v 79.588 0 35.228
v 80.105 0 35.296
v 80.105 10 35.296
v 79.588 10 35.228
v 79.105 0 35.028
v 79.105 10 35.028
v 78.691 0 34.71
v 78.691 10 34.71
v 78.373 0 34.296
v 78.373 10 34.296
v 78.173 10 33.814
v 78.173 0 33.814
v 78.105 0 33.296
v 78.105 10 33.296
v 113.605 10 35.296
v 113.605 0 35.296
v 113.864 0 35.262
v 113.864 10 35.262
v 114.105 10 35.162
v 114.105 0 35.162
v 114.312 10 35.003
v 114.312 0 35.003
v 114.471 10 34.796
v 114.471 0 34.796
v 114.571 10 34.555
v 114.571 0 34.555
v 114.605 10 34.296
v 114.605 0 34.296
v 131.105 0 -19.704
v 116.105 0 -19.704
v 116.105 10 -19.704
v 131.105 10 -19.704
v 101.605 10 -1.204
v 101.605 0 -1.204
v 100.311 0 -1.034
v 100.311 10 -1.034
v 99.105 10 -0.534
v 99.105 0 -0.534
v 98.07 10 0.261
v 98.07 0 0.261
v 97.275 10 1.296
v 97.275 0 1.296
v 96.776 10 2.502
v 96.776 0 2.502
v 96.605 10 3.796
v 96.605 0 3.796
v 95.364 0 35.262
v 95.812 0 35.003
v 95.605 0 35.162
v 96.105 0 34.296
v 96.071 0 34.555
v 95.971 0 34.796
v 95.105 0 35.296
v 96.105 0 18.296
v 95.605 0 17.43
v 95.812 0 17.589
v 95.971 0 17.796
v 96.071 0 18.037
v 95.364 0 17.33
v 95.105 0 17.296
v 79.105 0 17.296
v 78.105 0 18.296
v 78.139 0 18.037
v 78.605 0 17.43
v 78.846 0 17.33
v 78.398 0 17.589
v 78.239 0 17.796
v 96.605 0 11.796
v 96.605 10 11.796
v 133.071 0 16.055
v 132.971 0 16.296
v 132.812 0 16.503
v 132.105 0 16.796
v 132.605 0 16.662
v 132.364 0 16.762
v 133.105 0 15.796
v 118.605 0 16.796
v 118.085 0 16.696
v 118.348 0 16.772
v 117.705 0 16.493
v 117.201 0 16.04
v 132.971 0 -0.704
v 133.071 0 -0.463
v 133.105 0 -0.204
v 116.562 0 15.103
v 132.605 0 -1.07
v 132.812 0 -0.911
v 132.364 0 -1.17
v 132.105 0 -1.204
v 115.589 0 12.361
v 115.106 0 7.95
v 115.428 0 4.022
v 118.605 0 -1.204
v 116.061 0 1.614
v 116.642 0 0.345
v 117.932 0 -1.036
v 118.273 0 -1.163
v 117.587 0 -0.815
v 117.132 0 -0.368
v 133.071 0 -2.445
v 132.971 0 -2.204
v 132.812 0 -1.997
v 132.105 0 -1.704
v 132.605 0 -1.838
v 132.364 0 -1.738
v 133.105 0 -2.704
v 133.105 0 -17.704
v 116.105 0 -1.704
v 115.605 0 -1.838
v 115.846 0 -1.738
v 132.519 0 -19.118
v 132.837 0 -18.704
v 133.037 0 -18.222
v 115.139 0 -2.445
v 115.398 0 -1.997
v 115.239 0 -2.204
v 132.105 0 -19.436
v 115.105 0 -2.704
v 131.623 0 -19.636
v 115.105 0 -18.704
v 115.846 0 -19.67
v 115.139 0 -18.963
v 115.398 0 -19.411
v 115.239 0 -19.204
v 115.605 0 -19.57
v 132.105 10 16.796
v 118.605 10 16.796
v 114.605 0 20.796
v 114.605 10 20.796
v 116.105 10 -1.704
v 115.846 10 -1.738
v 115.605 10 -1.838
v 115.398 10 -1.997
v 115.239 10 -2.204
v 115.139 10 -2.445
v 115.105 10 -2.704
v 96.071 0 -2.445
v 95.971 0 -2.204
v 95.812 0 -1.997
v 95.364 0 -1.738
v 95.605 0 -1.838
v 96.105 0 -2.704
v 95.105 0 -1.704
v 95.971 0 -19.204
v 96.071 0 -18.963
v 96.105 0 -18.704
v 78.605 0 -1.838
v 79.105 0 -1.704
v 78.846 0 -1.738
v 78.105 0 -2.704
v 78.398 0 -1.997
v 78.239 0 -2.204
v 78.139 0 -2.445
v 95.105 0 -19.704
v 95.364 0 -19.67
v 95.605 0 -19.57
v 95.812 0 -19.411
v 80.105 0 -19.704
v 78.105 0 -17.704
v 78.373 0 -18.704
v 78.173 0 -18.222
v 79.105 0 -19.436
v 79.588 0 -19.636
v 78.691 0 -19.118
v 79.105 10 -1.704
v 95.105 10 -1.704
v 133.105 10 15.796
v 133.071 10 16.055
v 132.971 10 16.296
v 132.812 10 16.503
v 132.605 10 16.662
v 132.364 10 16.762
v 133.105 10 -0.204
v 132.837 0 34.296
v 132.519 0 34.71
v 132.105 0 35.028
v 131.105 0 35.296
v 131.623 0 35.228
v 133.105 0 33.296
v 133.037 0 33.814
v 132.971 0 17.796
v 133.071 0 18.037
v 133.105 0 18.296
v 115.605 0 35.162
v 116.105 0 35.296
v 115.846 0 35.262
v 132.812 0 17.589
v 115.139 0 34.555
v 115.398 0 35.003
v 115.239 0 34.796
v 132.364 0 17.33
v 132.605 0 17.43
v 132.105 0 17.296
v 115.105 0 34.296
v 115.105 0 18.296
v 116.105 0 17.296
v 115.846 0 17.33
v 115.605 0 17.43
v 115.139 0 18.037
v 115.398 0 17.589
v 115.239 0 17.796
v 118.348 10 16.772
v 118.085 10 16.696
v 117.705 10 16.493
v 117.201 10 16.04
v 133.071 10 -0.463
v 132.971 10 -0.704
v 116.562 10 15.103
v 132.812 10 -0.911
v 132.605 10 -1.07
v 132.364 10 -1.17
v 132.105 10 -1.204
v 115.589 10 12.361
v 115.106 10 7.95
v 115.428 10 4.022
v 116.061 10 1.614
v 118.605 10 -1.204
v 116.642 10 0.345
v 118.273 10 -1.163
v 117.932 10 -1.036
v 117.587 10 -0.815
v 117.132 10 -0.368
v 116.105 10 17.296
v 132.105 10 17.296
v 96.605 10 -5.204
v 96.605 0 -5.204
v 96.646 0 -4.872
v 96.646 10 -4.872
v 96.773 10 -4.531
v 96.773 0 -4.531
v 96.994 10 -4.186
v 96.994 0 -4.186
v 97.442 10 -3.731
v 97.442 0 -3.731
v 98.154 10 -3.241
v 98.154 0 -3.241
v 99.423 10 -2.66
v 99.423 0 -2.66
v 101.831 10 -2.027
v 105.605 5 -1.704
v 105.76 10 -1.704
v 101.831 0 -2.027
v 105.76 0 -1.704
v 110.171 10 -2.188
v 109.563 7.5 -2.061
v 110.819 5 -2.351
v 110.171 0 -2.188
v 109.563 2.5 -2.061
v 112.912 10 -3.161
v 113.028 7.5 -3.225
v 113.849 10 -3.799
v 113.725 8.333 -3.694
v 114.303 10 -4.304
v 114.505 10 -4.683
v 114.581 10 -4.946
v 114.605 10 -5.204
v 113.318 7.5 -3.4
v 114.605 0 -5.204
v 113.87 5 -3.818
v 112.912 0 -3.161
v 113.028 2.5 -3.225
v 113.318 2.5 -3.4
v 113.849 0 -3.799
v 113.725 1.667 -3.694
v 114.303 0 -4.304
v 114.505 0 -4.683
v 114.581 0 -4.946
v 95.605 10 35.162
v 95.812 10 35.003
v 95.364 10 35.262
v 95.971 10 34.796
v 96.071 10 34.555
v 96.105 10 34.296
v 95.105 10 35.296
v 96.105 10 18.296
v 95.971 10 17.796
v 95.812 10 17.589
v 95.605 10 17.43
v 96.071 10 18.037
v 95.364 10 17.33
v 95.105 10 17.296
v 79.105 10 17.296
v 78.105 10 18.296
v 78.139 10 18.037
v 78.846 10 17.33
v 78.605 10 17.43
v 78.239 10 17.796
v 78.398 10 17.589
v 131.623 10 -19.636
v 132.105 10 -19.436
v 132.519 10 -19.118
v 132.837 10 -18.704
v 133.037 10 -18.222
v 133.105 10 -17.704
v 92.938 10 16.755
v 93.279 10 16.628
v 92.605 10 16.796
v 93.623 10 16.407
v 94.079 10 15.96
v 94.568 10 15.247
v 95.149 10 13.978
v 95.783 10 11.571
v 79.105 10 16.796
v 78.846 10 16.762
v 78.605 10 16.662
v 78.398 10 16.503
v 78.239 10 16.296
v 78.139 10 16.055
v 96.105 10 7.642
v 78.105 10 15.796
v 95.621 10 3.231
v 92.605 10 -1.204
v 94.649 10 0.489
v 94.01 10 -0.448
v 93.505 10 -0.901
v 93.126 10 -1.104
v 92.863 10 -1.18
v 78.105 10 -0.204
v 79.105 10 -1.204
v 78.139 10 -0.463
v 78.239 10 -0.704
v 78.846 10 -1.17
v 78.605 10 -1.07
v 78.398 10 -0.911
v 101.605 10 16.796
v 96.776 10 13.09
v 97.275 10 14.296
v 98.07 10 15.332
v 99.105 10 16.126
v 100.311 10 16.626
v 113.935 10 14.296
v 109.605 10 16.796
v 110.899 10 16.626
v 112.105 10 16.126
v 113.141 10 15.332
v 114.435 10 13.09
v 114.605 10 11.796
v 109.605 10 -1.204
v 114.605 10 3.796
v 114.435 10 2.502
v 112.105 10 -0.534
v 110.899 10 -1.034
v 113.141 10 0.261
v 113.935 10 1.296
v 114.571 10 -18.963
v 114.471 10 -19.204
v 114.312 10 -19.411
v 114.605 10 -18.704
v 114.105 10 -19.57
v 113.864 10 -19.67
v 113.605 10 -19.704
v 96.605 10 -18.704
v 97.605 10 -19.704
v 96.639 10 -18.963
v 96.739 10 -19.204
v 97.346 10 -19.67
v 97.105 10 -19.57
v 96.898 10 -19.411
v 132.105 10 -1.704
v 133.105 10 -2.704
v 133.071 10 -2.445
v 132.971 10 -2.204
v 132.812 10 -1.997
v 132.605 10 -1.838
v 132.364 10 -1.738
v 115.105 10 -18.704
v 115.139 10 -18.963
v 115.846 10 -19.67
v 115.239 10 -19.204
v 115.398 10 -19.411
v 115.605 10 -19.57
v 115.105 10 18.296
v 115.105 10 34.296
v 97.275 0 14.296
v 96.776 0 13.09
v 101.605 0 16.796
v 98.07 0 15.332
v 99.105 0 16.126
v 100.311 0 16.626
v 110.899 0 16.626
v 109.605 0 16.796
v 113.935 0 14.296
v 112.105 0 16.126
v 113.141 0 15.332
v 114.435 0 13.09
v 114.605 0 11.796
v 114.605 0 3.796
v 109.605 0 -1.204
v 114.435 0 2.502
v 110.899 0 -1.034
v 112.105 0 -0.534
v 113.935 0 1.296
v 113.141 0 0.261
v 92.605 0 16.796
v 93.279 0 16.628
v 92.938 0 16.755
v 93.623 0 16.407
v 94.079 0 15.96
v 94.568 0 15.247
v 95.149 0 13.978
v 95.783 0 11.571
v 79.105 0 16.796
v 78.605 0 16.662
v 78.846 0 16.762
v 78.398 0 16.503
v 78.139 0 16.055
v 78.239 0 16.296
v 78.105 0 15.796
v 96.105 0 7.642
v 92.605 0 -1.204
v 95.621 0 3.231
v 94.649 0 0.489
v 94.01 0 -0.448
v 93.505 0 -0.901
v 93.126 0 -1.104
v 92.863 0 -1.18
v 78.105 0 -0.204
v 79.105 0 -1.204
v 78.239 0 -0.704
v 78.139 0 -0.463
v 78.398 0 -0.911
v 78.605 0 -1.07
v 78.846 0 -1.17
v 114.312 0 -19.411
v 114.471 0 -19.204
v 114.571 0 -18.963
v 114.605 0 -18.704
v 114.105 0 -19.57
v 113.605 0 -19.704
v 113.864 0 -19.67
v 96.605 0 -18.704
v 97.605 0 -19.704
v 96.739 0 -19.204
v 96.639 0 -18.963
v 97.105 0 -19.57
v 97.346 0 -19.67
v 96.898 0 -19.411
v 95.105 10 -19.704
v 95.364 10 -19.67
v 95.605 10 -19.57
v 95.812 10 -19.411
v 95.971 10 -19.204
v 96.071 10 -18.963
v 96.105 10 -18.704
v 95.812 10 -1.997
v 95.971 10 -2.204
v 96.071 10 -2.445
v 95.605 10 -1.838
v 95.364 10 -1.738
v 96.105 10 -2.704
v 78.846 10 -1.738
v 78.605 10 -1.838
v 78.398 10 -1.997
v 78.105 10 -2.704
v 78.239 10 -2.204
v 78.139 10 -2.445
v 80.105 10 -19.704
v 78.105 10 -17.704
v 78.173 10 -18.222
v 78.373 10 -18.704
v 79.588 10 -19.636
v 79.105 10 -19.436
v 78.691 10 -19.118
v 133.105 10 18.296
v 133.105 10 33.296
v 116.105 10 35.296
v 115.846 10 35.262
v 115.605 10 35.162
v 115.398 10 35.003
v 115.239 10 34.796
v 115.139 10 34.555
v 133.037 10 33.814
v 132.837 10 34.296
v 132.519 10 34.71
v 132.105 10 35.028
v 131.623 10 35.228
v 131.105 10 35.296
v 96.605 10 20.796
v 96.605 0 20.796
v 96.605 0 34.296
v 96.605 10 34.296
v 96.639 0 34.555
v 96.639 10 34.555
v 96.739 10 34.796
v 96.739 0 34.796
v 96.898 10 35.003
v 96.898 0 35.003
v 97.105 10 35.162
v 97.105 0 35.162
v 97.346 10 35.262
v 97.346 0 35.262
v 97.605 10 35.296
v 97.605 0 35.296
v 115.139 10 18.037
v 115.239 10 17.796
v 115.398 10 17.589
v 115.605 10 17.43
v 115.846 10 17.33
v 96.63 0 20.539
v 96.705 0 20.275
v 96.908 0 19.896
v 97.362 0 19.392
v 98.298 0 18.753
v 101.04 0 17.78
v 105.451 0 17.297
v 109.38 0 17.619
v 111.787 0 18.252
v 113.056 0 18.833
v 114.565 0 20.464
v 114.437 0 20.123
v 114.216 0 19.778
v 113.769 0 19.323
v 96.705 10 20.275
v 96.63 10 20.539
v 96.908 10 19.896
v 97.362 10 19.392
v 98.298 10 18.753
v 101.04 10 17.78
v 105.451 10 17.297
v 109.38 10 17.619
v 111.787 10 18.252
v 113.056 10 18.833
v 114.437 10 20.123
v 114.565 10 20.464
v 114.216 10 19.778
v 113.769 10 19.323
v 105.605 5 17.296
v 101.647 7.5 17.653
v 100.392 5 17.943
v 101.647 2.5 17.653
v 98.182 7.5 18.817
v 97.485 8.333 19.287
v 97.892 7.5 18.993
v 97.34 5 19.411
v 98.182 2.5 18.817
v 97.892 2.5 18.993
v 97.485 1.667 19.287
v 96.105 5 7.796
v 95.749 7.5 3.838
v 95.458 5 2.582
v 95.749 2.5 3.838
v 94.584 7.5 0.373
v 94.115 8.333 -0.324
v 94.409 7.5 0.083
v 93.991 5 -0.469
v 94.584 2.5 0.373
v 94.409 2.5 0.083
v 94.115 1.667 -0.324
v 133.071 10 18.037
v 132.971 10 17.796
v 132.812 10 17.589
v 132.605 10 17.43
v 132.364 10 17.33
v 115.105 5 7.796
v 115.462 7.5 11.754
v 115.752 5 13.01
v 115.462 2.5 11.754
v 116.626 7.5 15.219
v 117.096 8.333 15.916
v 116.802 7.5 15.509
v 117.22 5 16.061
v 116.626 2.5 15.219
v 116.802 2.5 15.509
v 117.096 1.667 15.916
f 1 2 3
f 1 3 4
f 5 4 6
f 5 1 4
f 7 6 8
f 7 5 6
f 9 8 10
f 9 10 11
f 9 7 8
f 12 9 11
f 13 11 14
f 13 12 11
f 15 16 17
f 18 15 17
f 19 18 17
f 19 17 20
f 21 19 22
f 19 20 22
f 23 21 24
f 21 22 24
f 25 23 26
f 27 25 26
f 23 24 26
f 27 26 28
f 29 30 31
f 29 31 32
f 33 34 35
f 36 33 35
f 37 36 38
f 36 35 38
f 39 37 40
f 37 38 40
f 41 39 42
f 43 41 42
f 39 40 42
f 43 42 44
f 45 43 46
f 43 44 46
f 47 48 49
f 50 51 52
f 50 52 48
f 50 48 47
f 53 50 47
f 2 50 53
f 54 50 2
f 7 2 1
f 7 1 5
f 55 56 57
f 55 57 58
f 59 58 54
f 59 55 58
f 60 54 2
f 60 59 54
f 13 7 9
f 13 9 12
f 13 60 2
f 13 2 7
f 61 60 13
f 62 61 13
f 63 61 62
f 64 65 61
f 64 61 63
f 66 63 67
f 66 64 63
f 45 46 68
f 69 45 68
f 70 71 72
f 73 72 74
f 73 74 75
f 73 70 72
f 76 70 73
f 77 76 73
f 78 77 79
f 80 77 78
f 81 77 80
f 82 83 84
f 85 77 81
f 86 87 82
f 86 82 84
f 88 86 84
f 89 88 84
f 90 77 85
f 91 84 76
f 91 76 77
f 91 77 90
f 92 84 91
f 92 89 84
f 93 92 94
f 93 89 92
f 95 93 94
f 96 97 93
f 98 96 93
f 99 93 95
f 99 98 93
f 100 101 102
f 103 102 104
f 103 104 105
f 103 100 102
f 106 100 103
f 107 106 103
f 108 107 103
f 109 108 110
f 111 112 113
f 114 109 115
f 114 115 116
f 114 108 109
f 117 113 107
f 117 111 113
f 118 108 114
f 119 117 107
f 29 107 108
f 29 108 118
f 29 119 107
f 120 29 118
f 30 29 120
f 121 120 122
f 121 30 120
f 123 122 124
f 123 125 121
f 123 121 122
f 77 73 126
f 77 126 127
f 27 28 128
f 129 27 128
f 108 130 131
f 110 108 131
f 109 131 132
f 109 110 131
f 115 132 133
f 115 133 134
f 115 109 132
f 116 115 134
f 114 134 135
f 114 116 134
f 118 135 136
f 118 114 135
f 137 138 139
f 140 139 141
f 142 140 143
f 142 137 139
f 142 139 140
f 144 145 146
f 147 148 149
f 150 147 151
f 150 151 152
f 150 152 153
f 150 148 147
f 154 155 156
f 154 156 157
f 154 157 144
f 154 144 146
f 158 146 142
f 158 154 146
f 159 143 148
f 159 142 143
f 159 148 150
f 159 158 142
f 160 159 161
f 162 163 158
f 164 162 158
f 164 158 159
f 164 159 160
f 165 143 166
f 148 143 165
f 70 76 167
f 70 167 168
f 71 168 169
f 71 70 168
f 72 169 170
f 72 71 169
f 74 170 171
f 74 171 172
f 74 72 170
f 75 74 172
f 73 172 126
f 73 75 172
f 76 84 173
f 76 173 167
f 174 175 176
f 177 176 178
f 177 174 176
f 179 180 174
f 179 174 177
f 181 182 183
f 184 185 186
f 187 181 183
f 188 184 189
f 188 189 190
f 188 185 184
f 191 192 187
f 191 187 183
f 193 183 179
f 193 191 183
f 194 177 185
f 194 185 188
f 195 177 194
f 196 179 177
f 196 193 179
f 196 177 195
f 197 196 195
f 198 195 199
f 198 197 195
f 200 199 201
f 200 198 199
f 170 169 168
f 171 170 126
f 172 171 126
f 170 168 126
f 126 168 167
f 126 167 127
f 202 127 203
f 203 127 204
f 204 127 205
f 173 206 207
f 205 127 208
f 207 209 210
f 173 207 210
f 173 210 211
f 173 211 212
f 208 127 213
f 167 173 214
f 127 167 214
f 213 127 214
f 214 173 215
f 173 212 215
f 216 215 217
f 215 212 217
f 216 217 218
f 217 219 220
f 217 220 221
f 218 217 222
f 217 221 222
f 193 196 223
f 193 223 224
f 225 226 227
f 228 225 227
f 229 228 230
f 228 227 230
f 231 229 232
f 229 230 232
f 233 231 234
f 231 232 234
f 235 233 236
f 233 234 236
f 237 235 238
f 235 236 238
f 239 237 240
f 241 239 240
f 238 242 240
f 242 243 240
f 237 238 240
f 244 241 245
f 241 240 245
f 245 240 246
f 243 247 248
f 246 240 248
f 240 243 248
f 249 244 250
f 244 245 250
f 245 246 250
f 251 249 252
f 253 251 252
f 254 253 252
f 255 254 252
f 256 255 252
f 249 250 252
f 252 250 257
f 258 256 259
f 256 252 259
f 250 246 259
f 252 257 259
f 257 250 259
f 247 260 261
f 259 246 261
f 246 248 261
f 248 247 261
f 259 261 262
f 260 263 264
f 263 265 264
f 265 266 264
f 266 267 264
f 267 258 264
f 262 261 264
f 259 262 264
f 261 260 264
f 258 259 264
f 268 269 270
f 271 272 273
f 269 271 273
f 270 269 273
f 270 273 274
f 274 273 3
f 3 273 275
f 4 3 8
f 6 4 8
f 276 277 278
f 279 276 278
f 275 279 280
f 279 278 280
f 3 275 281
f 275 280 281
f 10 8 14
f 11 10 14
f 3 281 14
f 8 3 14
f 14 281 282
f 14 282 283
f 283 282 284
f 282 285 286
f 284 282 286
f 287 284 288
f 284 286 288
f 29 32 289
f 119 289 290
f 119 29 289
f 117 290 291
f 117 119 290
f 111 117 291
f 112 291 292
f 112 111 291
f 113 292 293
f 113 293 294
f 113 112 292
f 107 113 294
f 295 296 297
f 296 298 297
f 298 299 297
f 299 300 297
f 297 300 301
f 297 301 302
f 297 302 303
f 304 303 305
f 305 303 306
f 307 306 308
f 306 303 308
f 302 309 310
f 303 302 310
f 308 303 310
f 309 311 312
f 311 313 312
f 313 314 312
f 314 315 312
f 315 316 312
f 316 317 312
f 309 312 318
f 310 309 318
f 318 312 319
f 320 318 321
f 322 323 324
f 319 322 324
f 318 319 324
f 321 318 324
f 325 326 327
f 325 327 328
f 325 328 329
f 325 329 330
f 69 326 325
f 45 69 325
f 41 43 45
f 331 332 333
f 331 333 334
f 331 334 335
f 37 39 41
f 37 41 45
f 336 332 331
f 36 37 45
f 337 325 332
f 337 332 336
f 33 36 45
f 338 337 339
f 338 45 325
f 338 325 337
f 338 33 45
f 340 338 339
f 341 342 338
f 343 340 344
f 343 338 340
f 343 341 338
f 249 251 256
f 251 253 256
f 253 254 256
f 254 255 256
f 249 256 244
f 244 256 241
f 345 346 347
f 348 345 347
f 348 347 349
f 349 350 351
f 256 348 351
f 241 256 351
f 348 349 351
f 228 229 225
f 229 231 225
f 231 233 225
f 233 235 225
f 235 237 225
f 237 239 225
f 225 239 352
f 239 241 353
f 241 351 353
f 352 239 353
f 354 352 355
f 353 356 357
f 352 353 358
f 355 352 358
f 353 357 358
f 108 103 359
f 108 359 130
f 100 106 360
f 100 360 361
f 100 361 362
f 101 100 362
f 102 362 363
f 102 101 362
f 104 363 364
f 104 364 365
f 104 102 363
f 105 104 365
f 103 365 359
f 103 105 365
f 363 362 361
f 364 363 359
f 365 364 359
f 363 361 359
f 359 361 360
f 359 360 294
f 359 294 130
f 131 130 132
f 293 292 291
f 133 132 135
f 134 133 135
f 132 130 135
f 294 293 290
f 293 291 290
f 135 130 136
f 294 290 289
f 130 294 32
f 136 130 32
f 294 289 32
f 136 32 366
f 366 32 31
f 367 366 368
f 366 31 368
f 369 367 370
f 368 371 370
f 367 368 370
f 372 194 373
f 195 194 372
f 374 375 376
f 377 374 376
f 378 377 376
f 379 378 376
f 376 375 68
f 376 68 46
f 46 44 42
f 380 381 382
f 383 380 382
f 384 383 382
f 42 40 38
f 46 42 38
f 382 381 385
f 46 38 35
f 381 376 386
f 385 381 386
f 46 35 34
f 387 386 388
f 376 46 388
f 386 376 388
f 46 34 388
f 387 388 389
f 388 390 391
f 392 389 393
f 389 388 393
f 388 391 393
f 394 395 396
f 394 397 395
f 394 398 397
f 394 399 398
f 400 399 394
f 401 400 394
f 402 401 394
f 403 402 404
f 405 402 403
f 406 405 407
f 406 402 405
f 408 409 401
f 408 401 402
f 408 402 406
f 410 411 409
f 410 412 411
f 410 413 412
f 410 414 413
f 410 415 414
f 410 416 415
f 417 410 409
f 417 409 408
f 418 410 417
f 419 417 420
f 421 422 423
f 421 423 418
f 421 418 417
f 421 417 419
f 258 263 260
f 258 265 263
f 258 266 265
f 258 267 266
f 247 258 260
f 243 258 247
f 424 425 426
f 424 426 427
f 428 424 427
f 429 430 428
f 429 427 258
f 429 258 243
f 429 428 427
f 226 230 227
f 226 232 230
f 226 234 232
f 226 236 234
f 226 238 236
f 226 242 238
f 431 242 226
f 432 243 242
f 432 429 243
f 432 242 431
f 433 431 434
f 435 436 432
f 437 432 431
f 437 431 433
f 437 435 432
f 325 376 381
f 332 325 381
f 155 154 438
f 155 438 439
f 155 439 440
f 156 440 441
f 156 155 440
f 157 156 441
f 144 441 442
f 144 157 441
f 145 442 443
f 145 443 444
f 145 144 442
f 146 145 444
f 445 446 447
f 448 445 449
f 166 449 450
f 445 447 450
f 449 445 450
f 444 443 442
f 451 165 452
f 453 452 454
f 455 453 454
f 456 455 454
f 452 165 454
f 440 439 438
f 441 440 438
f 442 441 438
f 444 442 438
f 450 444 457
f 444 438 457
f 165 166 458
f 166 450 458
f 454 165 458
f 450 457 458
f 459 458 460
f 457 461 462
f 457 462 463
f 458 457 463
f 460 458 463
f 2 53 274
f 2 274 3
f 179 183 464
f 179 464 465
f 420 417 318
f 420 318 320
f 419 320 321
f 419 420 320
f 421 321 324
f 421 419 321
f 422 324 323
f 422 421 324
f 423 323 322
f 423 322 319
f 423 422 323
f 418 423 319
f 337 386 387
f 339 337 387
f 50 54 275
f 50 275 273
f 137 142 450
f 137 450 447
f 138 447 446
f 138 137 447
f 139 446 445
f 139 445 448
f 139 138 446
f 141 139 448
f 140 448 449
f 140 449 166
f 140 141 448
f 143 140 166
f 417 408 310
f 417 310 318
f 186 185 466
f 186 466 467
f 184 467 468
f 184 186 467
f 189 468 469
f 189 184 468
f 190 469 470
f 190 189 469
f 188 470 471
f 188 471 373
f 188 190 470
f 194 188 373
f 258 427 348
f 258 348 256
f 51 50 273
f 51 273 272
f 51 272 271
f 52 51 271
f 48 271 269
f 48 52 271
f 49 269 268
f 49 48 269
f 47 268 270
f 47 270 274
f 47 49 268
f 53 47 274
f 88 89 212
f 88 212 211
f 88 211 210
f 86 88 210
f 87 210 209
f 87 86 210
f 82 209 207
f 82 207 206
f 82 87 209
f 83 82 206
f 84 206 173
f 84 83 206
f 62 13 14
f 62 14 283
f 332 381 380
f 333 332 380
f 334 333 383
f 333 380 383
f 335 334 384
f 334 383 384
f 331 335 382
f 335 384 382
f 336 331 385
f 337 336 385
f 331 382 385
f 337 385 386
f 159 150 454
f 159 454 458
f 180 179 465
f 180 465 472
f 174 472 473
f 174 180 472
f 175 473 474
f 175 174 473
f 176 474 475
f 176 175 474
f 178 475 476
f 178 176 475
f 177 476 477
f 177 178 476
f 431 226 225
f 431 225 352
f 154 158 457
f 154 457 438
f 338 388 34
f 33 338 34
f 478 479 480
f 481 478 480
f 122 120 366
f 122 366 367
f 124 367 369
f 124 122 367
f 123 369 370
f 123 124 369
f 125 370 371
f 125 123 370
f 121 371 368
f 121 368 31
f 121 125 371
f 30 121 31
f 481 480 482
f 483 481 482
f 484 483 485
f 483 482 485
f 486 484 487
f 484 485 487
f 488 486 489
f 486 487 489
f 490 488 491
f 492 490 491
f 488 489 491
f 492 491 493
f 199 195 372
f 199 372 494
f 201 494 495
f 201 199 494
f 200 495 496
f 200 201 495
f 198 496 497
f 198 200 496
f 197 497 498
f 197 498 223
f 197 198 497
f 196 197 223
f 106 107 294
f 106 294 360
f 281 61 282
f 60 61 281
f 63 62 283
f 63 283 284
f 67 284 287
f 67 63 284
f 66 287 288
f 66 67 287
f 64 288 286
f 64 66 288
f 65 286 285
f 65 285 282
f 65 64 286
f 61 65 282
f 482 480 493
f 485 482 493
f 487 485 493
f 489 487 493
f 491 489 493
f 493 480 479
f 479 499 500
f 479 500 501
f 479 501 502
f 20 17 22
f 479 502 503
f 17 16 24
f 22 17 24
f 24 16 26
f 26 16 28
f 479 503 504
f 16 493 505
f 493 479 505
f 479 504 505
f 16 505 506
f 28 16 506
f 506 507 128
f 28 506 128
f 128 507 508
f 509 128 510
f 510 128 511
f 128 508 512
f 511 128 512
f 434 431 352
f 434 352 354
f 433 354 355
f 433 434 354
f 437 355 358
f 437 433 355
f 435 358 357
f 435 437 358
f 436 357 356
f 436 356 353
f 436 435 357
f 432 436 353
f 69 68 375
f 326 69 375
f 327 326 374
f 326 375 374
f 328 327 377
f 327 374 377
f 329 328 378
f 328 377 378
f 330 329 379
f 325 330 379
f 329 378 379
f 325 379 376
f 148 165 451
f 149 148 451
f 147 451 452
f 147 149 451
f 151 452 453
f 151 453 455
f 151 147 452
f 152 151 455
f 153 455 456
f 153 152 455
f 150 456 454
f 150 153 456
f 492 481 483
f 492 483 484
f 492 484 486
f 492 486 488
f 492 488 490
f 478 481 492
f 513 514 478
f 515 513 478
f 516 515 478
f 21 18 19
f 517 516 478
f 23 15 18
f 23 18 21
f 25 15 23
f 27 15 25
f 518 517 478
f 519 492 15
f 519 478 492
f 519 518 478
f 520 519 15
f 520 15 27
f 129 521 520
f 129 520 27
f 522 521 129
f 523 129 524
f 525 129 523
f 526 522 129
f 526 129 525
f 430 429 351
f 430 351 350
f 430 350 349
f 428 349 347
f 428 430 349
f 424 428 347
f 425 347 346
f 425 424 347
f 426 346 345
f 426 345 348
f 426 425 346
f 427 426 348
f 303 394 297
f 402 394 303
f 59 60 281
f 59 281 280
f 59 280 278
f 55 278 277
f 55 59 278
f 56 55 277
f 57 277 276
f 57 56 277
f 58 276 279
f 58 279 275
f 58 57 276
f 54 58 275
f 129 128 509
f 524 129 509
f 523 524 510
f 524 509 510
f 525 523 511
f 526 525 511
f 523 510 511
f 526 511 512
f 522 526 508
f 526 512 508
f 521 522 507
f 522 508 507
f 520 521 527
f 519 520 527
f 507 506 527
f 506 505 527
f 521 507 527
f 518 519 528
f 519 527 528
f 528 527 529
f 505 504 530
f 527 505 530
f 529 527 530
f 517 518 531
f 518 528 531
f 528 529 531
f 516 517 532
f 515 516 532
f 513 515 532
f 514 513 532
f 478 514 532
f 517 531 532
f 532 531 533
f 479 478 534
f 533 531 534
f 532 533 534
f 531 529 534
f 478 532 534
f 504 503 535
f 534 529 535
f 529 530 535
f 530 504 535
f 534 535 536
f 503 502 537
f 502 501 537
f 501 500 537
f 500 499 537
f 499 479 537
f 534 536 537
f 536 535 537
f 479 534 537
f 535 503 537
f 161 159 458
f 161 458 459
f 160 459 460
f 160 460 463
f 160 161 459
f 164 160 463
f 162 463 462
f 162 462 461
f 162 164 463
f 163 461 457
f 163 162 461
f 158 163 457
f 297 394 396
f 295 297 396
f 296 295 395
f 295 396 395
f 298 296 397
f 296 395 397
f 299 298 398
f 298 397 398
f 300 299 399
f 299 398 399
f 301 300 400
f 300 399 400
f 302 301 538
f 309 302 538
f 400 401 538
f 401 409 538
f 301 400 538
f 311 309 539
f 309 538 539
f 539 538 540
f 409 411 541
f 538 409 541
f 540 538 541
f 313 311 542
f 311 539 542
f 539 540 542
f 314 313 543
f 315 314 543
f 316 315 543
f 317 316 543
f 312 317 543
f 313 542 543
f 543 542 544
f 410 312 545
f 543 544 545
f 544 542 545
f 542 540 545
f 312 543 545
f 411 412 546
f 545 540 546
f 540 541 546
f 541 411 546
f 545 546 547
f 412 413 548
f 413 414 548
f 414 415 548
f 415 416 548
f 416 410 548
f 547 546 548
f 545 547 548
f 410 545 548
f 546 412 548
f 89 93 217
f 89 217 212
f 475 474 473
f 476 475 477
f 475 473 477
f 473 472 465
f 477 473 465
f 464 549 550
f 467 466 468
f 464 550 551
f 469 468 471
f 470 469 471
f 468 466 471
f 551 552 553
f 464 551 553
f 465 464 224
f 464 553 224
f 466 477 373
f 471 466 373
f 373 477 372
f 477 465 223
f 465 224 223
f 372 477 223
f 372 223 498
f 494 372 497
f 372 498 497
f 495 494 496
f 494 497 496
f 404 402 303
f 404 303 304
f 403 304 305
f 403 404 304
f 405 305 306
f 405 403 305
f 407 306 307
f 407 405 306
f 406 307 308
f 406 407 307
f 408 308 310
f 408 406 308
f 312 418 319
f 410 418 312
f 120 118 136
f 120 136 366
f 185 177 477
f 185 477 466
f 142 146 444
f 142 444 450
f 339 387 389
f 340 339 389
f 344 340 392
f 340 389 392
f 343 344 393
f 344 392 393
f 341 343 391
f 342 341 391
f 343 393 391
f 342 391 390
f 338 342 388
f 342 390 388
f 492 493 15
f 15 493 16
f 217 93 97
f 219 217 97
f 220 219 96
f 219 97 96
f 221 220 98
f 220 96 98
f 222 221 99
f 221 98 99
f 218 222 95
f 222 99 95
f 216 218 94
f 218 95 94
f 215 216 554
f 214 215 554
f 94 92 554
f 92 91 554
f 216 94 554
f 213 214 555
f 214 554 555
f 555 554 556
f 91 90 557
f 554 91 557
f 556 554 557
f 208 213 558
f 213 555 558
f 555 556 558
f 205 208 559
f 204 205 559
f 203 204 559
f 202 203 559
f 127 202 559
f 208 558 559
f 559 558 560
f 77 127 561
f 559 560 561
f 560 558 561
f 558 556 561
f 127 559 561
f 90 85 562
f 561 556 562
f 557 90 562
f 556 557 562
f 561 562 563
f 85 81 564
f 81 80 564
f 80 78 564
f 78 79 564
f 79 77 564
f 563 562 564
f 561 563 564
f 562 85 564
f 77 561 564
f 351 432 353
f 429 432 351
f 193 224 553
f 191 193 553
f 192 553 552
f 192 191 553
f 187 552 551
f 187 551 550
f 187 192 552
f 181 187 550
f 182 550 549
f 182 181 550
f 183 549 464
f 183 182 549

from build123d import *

# Parameters (mm, degrees)
BOSS_EXTRUDE1_DEPTH   = 10
BOSS_EXTRUDE1_2_DEPTH = 10
BOSS_EXTRUDE1_3_DEPTH = 10
BOSS_EXTRUDE1_4_DEPTH = 10
BOSS_EXTRUDE1_5_DEPTH = 10
BOSS_EXTRUDE1_6_DEPTH = 10
BOSS_EXTRUDE1_7_DEPTH = 10
BOSS_EXTRUDE1_8_DEPTH = 10
BOSS_EXTRUDE1_9_DEPTH = 10


with BuildPart() as part:
    # Sketch2 → Boss-Extrude1 (new body)
    with BuildSketch(Plane(origin=(0, 0, 0), x_dir=(1, 0, 0), z_dir=(0, 1, 0))):
        with BuildLine():
            Line((80.105220523, 19.703918666), (95.105220523, 19.703918666))
            ThreePointArc((95.105220523, 19.703918666), (95.812327305, 19.411025447), (96.105220523, 18.703918666))
            Line((96.105220523, 18.703918666), (96.105220523, 2.703918666))
            ThreePointArc((96.105220523, 2.703918666), (95.812327305, 1.996811885), (95.105220523, 1.703918666))
            Line((95.105220523, 1.703918666), (79.105220523, 1.703918666))
            ThreePointArc((79.105220523, 1.703918666), (78.398113742, 1.996811885), (78.105220523, 2.703918666))
            Line((78.105220523, 2.703918666), (78.105220523, 17.703918666))
            ThreePointArc((78.105220523, 17.703918666), (78.691006961, 19.118132229), (80.105220523, 19.703918666))
        make_face()
    extrude(amount=BOSS_EXTRUDE1_DEPTH)


with BuildPart() as body_2:
    # Sketch2 → Boss-Extrude1 2 (new body)
    with BuildSketch(Plane(origin=(0, 0, 0), x_dir=(1, 0, 0), z_dir=(0, 1, 0))):
        with BuildLine():
            Line((96.605220523, -3.796081334), (96.605220523, -11.796081334))
            ThreePointArc((96.605220523, -11.796081334), (98.069686617, -15.33161524), (101.605220523, -16.796081334))
            Line((101.605220523, -16.796081334), (109.605220523, -16.796081334))
            ThreePointArc((109.605220523, -16.796081334), (113.140754429, -15.33161524), (114.605220523, -11.796081334))
            Line((114.605220523, -11.796081334), (114.605220523, -3.796081334))
            ThreePointArc((114.605220523, -3.796081334), (113.140754429, -0.260547428), (109.605220523, 1.203918666))
            Line((109.605220523, 1.203918666), (101.605220523, 1.203918666))
            ThreePointArc((101.605220523, 1.203918666), (98.069686617, -0.260547428), (96.605220523, -3.796081334))
        make_face()
    extrude(amount=BOSS_EXTRUDE1_2_DEPTH)


with BuildPart() as body_3:
    # Sketch2 → Boss-Extrude1 3 (new body)
    with BuildSketch(Plane(origin=(0, 0, 0), x_dir=(1, 0, 0), z_dir=(0, 1, 0))):
        with BuildLine():
            Line((79.105220523, 1.203918666), (92.605220523, 1.203918666))
            add(Edge.make_bspline(
                [(92.605220523, -16.796081334), (96.105220523, -16.796081334), (96.105220523, -7.796081334), (96.105220523, 1.203918666), (92.605220523, 1.203918666)],
                knots=[3.141592654, 3.141592654, 3.141592654, 4.71238898, 4.71238898, 6.283185307, 6.283185307, 6.283185307], degree=2, weights=[1, 0.707106781, 1, 0.707106781, 1]))
            Line((92.605220523, -16.796081334), (79.105220523, -16.796081334))
            ThreePointArc((79.105220523, -16.796081334), (78.398113742, -16.503188115), (78.105220523, -15.796081334))
            Line((78.105220523, -15.796081334), (78.105220523, 0.203918666))
            ThreePointArc((78.105220523, 0.203918666), (78.398113742, 0.911025447), (79.105220523, 1.203918666))
        make_face()
    extrude(amount=BOSS_EXTRUDE1_3_DEPTH)


with BuildPart() as body_4:
    # Sketch2 → Boss-Extrude1 4 (new body)
    with BuildSketch(Plane(origin=(0, 0, 0), x_dir=(1, 0, 0), z_dir=(0, 1, 0))):
        with BuildLine():
            Line((97.605220523, 19.703918666), (113.605220523, 19.703918666))
            ThreePointArc((113.605220523, 19.703918666), (114.312327305, 19.411025447), (114.605220523, 18.703918666))
            Line((114.605220523, 18.703918666), (114.605220523, 5.203918666))
            add(Edge.make_bspline(
                [(96.605220523, 5.203918666), (96.605220523, 1.703918666), (105.605220523, 1.703918666), (114.605220523, 1.703918666), (114.605220523, 5.203918666)],
                knots=[0, 0, 0, 1.570796327, 1.570796327, 3.141592654, 3.141592654, 3.141592654], degree=2, weights=[1, 0.707106781, 1, 0.707106781, 1]))
            Line((96.605220523, 5.203918666), (96.605220523, 18.703918666))
            ThreePointArc((96.605220523, 18.703918666), (96.898113742, 19.411025447), (97.605220523, 19.703918666))
        make_face()
    extrude(amount=BOSS_EXTRUDE1_4_DEPTH)


with BuildPart() as body_5:
    # Sketch2 → Boss-Extrude1 5 (new body)
    with BuildSketch(Plane(origin=(0, 0, 0), x_dir=(1, 0, 0), z_dir=(0, 1, 0))):
        with BuildLine():
            Line((133.105220523, 17.703918666), (133.105220523, 2.703918666))
            ThreePointArc((133.105220523, 2.703918666), (132.812327305, 1.996811885), (132.105220523, 1.703918666))
            Line((132.105220523, 1.703918666), (116.105220523, 1.703918666))
            ThreePointArc((116.105220523, 1.703918666), (115.398113742, 1.996811885), (115.105220523, 2.703918666))
            Line((115.105220523, 2.703918666), (115.105220523, 18.703918666))
            ThreePointArc((115.105220523, 18.703918666), (115.398113742, 19.411025447), (116.105220523, 19.703918666))
            Line((116.105220523, 19.703918666), (131.105220523, 19.703918666))
            ThreePointArc((131.105220523, 19.703918666), (132.519434086, 19.118132229), (133.105220523, 17.703918666))
        make_face()
    extrude(amount=BOSS_EXTRUDE1_5_DEPTH)


with BuildPart() as body_6:
    # Sketch2 → Boss-Extrude1 6 (new body)
    with BuildSketch(Plane(origin=(0, 0, 0), x_dir=(1, 0, 0), z_dir=(0, 1, 0))):
        with BuildLine():
            Line((133.105220523, 0.203918666), (133.105220523, -15.796081334))
            ThreePointArc((133.105220523, -15.796081334), (132.812327305, -16.503188115), (132.105220523, -16.796081334))
            Line((132.105220523, -16.796081334), (118.605220523, -16.796081334))
            add(Edge.make_bspline(
                [(118.605220523, 1.203918666), (115.105220523, 1.203918666), (115.105220523, -7.796081334), (115.105220523, -16.796081334), (118.605220523, -16.796081334)],
                knots=[0, 0, 0, 1.570796327, 1.570796327, 3.141592654, 3.141592654, 3.141592654], degree=2, weights=[1, 0.707106781, 1, 0.707106781, 1]))
            Line((118.605220523, 1.203918666), (132.105220523, 1.203918666))
            ThreePointArc((132.105220523, 1.203918666), (132.812327305, 0.911025447), (133.105220523, 0.203918666))
        make_face()
    extrude(amount=BOSS_EXTRUDE1_6_DEPTH)


with BuildPart() as body_7:
    # Sketch2 → Boss-Extrude1 7 (new body)
    with BuildSketch(Plane(origin=(0, 0, 0), x_dir=(1, 0, 0), z_dir=(0, 1, 0))):
        with BuildLine():
            Line((131.105220523, -35.296081334), (116.105220523, -35.296081334))
            ThreePointArc((116.105220523, -35.296081334), (115.398113742, -35.003188115), (115.105220523, -34.296081334))
            Line((115.105220523, -34.296081334), (115.105220523, -18.296081334))
            ThreePointArc((115.105220523, -18.296081334), (115.398113742, -17.588974553), (116.105220523, -17.296081334))
            Line((116.105220523, -17.296081334), (132.105220523, -17.296081334))
            ThreePointArc((132.105220523, -17.296081334), (132.812327305, -17.588974553), (133.105220523, -18.296081334))
            Line((133.105220523, -18.296081334), (133.105220523, -33.296081334))
            ThreePointArc((133.105220523, -33.296081334), (132.519434086, -34.710294896), (131.105220523, -35.296081334))
        make_face()
    extrude(amount=BOSS_EXTRUDE1_7_DEPTH)


with BuildPart() as body_8:
    # Sketch2 → Boss-Extrude1 8 (new body)
    with BuildSketch(Plane(origin=(0, 0, 0), x_dir=(1, 0, 0), z_dir=(0, 1, 0))):
        with BuildLine():
            Line((114.605220523, -34.296081334), (114.605220523, -20.796081334))
            add(Edge.make_bspline(
                [(114.605220523, -20.796081334), (114.605220523, -17.296081334), (105.605220523, -17.296081334), (96.605220523, -17.296081334), (96.605220523, -20.796081334)],
                knots=[3.141592654, 3.141592654, 3.141592654, 4.71238898, 4.71238898, 6.283185307, 6.283185307, 6.283185307], degree=2, weights=[1, 0.707106781, 1, 0.707106781, 1]))
            Line((96.605220523, -20.796081334), (96.605220523, -34.296081334))
            ThreePointArc((96.605220523, -34.296081334), (96.898113742, -35.003188115), (97.605220523, -35.296081334))
            Line((97.605220523, -35.296081334), (113.605220523, -35.296081334))
            ThreePointArc((113.605220523, -35.296081334), (114.312327305, -35.003188115), (114.605220523, -34.296081334))
        make_face()
    extrude(amount=BOSS_EXTRUDE1_8_DEPTH)


with BuildPart() as body_9:
    # Sketch2 → Boss-Extrude1 9 (new body)
    with BuildSketch(Plane(origin=(0, 0, 0), x_dir=(1, 0, 0), z_dir=(0, 1, 0))):
        with BuildLine():
            Line((78.105220523, -33.296081334), (78.105220523, -18.296081334))
            ThreePointArc((78.105220523, -18.296081334), (78.398113742, -17.588974553), (79.105220523, -17.296081334))
            Line((79.105220523, -17.296081334), (95.105220523, -17.296081334))
            ThreePointArc((95.105220523, -17.296081334), (95.812327305, -17.588974553), (96.105220523, -18.296081334))
            Line((96.105220523, -18.296081334), (96.105220523, -34.296081334))
            ThreePointArc((96.105220523, -34.296081334), (95.812327305, -35.003188115), (95.105220523, -35.296081334))
            Line((95.105220523, -35.296081334), (80.105220523, -35.296081334))
            ThreePointArc((80.105220523, -35.296081334), (78.691006961, -34.710294896), (78.105220523, -33.296081334))
        make_face()
    extrude(amount=BOSS_EXTRUDE1_9_DEPTH)


solid = Compound([part.part, body_2.part, body_3.part, body_4.part, body_5.part, body_6.part, body_7.part, body_8.part, body_9.part])
